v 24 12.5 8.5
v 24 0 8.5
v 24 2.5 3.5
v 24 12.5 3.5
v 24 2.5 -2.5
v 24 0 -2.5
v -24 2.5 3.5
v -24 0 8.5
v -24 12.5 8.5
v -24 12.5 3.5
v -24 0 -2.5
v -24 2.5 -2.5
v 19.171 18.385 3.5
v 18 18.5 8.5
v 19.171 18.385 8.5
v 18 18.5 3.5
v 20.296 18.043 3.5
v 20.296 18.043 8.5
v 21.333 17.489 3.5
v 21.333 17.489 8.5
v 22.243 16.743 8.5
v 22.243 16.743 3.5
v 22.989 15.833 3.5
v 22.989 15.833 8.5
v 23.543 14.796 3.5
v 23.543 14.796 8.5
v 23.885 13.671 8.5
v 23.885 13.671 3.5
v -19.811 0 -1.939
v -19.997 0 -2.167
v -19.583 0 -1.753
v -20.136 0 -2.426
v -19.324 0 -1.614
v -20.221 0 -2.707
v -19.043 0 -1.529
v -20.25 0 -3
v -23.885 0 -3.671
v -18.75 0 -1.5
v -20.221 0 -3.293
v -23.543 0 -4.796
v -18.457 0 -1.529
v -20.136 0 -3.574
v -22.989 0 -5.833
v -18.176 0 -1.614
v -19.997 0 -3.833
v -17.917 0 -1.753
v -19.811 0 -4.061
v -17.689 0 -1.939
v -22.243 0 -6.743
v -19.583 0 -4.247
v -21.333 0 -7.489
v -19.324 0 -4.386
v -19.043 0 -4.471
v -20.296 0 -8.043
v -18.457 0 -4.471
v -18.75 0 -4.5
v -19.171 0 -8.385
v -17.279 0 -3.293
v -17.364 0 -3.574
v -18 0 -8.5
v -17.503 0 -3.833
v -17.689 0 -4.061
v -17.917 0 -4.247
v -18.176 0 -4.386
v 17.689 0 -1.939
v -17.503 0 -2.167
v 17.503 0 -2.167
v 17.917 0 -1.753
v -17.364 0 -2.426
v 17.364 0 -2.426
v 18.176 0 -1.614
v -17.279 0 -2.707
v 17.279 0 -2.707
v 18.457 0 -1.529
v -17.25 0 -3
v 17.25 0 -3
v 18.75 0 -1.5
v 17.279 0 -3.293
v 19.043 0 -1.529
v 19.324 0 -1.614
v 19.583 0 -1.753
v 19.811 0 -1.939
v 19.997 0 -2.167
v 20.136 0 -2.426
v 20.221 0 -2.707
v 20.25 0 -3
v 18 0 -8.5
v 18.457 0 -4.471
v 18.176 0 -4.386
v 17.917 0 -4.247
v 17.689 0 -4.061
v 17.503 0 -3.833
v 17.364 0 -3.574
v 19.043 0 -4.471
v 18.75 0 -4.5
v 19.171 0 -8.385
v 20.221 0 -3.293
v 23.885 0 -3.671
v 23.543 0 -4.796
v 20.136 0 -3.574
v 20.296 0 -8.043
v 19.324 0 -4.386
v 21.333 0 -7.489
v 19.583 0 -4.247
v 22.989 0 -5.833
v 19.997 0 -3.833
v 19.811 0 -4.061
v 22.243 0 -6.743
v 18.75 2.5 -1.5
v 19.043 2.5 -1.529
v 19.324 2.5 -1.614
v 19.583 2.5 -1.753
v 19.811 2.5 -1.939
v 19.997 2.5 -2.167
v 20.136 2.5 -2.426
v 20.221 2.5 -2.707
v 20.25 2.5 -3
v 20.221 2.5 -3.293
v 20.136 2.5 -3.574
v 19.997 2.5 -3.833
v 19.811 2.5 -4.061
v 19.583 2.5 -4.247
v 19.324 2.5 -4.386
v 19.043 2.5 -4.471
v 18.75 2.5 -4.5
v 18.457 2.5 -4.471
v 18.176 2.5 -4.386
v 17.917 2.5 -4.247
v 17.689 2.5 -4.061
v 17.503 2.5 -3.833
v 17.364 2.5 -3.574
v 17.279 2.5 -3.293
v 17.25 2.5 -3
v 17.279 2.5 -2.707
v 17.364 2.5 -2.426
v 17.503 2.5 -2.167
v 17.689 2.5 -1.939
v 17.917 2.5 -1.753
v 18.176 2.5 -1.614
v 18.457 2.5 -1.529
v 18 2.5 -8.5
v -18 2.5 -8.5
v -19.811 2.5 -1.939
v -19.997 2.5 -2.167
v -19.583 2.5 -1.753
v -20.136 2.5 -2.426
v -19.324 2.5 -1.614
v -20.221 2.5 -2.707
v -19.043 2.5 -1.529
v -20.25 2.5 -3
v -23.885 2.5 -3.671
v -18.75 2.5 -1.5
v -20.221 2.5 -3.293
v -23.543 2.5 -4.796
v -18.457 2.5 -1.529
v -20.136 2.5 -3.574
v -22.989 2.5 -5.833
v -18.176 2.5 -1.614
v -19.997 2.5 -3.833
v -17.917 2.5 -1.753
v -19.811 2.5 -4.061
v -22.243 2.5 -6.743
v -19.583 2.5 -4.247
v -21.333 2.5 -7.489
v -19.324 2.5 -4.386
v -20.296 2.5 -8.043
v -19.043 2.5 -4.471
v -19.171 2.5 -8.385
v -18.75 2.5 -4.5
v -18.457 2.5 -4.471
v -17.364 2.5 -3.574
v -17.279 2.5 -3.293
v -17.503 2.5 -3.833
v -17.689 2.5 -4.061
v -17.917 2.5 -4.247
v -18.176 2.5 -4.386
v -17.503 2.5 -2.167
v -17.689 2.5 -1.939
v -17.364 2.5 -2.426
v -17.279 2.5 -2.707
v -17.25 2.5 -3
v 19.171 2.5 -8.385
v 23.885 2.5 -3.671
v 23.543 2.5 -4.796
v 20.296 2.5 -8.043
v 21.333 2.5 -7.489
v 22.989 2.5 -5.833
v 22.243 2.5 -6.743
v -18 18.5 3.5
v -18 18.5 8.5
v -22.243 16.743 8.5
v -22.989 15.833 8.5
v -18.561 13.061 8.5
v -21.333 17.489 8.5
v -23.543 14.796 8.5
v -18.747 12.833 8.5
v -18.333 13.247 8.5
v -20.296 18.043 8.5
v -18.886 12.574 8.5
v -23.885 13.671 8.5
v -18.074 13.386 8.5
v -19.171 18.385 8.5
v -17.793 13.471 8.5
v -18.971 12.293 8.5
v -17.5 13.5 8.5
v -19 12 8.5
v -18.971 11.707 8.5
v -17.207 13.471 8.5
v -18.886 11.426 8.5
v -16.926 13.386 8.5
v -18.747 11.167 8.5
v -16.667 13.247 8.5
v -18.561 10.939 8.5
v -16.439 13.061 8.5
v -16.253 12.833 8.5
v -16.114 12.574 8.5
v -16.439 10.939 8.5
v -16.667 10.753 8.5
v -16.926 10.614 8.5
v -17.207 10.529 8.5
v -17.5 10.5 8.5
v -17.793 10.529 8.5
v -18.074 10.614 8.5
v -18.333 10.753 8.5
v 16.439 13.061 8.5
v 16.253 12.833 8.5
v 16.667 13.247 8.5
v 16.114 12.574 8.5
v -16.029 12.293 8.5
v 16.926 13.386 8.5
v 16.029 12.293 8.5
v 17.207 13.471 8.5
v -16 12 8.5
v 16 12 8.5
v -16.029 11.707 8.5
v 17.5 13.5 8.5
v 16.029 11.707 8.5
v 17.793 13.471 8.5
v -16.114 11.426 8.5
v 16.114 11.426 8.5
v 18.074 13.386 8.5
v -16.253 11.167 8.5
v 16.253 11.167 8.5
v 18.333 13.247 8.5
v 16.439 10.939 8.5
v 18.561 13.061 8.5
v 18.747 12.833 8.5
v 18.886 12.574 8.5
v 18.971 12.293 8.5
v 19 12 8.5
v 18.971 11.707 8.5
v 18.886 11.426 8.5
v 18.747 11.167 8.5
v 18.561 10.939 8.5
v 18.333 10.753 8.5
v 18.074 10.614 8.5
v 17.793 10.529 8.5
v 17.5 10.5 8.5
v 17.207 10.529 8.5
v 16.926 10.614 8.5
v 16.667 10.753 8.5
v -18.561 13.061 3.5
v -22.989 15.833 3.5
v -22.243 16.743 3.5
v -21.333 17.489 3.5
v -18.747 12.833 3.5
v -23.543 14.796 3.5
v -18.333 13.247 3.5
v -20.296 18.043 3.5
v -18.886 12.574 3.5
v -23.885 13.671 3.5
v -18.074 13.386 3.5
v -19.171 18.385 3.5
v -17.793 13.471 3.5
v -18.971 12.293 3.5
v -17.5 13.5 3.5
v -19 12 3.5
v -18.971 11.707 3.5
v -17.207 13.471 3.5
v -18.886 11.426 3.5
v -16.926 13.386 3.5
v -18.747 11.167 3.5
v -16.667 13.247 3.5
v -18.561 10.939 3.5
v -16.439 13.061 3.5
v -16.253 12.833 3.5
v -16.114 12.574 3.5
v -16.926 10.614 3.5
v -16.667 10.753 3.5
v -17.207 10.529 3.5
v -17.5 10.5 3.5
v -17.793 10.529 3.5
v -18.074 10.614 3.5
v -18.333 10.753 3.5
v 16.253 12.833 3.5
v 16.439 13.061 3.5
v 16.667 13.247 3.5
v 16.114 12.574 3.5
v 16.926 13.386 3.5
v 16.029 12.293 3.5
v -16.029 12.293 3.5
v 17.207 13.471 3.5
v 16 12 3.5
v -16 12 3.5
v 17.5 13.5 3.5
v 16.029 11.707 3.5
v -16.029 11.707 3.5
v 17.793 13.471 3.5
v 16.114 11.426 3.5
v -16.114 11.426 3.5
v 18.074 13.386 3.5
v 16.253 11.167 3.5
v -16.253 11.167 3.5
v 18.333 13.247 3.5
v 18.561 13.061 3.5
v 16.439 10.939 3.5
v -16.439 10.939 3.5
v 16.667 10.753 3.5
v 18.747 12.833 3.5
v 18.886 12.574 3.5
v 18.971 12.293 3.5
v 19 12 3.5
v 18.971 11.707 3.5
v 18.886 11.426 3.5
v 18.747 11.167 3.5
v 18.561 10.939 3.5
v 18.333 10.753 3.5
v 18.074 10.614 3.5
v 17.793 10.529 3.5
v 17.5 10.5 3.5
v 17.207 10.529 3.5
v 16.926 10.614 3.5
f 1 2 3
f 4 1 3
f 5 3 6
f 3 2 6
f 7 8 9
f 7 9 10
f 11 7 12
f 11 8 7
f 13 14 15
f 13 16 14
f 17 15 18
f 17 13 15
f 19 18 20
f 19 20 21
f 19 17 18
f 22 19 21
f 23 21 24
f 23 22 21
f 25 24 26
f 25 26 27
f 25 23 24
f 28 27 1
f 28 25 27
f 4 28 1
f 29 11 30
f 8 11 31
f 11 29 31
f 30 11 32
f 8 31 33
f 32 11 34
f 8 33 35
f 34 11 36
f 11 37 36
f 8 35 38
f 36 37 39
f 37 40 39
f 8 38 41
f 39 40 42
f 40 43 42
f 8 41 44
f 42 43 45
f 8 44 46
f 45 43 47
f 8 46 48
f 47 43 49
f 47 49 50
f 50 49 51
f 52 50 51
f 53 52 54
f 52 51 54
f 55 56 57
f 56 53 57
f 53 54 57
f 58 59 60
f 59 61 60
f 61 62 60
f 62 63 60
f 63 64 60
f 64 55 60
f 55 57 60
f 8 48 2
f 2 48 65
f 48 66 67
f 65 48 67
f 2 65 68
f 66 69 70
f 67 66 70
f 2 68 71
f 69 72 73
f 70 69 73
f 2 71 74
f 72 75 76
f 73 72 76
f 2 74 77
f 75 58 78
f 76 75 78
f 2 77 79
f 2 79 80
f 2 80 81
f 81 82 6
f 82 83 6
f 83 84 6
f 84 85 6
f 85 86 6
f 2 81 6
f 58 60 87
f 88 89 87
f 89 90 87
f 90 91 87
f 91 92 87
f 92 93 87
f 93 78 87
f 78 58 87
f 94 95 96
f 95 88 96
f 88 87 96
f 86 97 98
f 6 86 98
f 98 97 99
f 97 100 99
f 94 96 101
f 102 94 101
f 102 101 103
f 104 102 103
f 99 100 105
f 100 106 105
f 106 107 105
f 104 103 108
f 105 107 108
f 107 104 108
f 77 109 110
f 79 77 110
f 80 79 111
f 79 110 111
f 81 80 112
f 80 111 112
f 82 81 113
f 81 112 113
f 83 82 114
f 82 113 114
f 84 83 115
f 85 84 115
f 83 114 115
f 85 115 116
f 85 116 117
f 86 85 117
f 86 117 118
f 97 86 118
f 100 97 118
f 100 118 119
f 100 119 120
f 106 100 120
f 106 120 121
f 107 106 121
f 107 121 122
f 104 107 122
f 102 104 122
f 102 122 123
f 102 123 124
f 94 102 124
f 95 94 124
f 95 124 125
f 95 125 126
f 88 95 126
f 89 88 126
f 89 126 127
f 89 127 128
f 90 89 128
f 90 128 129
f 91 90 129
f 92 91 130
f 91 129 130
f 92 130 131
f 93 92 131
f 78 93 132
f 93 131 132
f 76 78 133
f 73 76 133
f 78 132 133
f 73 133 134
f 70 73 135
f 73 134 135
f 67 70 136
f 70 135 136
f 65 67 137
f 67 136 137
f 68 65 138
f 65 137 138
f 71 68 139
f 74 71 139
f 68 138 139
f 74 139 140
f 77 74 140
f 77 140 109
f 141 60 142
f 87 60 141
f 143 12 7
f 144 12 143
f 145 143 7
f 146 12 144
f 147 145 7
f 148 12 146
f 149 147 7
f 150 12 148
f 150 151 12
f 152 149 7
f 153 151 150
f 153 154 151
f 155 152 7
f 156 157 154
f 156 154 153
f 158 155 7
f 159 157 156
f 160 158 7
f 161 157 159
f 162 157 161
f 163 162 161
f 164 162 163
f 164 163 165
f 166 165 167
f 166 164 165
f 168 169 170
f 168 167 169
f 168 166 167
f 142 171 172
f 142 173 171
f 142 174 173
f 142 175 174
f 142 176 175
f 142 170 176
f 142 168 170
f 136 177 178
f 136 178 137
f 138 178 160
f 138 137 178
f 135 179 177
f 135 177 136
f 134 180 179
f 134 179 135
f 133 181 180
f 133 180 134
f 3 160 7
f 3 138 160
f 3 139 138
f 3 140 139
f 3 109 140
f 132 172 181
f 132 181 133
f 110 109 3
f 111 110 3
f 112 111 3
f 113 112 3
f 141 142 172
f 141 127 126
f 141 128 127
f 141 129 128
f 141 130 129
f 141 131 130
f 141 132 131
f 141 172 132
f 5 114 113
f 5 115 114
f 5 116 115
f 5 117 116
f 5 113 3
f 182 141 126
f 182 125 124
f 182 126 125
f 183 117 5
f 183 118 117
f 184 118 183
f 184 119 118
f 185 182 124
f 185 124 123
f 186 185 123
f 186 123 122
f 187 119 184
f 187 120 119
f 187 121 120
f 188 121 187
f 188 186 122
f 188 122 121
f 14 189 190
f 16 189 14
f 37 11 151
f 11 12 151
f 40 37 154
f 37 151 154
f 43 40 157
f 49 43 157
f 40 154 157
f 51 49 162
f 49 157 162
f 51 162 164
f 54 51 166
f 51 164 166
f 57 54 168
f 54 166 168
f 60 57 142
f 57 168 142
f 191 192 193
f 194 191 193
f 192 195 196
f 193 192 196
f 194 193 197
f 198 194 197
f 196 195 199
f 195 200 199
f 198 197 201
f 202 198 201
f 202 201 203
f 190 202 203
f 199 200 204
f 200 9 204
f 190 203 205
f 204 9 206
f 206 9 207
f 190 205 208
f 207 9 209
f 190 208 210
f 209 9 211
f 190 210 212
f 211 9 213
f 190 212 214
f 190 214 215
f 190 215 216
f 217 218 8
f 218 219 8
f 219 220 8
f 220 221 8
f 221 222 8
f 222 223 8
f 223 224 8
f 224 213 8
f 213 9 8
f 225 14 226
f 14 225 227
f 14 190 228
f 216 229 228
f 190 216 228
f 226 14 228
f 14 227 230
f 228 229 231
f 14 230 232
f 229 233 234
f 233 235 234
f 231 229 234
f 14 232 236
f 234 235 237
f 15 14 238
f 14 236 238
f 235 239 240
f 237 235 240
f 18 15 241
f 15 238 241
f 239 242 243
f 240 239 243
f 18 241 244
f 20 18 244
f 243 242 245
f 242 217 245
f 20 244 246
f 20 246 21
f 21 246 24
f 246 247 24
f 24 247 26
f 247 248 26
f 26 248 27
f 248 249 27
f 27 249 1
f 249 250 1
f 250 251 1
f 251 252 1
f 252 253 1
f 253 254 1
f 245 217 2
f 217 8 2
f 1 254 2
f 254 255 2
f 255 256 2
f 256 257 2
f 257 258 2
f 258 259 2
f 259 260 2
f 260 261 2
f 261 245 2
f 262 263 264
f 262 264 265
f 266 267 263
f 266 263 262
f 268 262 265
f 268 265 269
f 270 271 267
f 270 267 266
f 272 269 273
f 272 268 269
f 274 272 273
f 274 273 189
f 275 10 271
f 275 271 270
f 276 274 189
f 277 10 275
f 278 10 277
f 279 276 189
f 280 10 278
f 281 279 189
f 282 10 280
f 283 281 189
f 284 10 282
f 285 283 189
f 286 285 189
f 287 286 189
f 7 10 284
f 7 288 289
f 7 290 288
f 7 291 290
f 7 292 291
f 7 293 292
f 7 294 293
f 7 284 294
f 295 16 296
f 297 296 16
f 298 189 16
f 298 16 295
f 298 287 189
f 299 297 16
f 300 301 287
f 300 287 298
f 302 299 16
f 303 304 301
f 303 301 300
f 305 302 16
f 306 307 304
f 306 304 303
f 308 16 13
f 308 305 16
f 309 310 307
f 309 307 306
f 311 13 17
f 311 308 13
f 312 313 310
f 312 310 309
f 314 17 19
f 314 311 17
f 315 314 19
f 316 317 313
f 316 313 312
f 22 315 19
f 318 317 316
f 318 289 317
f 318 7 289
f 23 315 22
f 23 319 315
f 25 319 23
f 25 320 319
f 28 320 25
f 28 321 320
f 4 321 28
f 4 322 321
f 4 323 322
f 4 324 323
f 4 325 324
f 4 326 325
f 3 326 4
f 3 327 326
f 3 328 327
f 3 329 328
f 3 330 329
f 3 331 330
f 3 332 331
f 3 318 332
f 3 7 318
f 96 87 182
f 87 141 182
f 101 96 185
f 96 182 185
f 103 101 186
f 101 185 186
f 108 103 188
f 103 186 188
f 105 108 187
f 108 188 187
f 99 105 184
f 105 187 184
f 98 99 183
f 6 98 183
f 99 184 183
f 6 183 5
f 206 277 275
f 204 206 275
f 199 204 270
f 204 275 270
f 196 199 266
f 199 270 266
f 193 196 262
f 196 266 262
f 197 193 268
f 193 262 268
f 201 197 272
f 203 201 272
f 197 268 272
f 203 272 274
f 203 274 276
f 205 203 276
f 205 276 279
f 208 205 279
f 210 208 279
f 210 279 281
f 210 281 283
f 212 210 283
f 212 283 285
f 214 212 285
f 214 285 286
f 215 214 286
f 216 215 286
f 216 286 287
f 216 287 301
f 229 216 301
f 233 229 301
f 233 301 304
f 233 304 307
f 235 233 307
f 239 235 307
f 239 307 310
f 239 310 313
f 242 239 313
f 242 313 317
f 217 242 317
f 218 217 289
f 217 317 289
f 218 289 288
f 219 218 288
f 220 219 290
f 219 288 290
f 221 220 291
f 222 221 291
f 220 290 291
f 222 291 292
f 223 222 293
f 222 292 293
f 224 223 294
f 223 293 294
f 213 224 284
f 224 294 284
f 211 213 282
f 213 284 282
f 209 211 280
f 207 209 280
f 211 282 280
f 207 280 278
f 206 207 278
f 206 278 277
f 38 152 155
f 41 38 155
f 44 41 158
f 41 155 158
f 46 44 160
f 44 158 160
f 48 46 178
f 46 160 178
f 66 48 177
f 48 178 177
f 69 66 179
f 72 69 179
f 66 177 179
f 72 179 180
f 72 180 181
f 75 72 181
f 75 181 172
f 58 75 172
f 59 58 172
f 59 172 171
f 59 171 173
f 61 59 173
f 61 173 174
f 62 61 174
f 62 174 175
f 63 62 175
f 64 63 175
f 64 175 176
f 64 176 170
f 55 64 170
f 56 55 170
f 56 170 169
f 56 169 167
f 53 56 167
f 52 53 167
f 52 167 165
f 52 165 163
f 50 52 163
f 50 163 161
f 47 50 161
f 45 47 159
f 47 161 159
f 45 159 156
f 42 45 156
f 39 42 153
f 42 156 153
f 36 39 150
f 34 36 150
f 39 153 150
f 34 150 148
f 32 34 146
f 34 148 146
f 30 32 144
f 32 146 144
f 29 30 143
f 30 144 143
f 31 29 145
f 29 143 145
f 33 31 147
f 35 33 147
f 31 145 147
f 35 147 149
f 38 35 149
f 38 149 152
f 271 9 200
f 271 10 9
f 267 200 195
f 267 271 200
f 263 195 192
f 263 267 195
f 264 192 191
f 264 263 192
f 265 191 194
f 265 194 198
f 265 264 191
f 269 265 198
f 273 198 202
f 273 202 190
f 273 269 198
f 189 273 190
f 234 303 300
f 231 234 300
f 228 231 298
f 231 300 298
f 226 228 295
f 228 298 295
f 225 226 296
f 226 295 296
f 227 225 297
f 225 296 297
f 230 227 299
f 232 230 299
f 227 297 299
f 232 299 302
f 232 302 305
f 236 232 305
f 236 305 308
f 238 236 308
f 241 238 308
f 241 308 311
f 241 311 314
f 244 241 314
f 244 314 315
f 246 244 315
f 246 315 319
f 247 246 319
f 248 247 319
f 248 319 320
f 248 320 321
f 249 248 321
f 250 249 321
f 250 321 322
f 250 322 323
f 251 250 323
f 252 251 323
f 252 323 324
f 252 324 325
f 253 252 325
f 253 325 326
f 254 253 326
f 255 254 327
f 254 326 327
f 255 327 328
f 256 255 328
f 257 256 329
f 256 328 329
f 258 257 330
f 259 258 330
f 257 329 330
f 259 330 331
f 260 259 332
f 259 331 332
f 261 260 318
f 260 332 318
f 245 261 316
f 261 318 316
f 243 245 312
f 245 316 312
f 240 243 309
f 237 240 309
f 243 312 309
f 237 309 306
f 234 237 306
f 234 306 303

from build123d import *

# Parameters (mm, degrees)
SKETCH_1_W          = 48
SKETCH_1_H          = 17
EXTRUDE_1_DEPTH     = 2.5
SKETCH_2_W          = 48
SKETCH_2_H          = 5
EXTRUDE_2_DEPTH     = 16
SKETCH_3_R          = 1.5
CUT_EXTRUDE_1_DEPTH = 20
FILLET_1_R          = 6
SKETCH_4_R          = 1.5
CUT_EXTRUDE_2_DEPTH = 20


with BuildPart() as part:
    # 草图1 → 凸台-拉伸1 (new body)
    with BuildSketch(Plane(origin=(0, 0, 0), x_dir=(1, 0, 0), z_dir=(0, 1, 0))):
        Rectangle(SKETCH_1_W, SKETCH_1_H)
    extrude(amount=EXTRUDE_1_DEPTH)

    # 草图2 → 凸台-拉伸2 (add)
    with BuildSketch(Plane(origin=(0, 2.5, 0), x_dir=(1, 0, 0), z_dir=(0, 1, 0))):
        with Locations((0, -6)):
            Rectangle(SKETCH_2_W, SKETCH_2_H)
    extrude(amount=EXTRUDE_2_DEPTH)

    # 草图3 → 切除-拉伸1 (cut)
    with BuildSketch(Plane(origin=(0, 2.5, 0), x_dir=(1, 0, 0), z_dir=(0, 1, 0))):
        with Locations(Location((18.75, 3, 0), (0, 0, 270))):
            Circle(SKETCH_3_R)
        with Locations(Location((-18.75, 3, 0), (0, 0, 270))):
            Circle(SKETCH_3_R)
    extrude(amount=-CUT_EXTRUDE_1_DEPTH, mode=Mode.SUBTRACT)

    # 圆角1
    fillet_1_edges = [part.edges().sort_by_distance(p)[0] for p in [
        (24, 18.5, 6),
        (-24, 18.5, 6),
        (-24, 1.25, -8.5),
        (24, 1.25, -8.5),
    ]]
    fillet(fillet_1_edges, radius=FILLET_1_R)

    # 草图4 → 切除-拉伸2 (cut)
    with BuildSketch(Plane(origin=(0, 0, 3.5), x_dir=(-1, 0, 0), z_dir=(0, 0, -1))):
        with Locations((17.5, 12)):
            Circle(SKETCH_4_R)
        with Locations((-17.5, 12)):
            Circle(SKETCH_4_R)
    extrude(amount=-CUT_EXTRUDE_2_DEPTH, mode=Mode.SUBTRACT)


solid = part.part
